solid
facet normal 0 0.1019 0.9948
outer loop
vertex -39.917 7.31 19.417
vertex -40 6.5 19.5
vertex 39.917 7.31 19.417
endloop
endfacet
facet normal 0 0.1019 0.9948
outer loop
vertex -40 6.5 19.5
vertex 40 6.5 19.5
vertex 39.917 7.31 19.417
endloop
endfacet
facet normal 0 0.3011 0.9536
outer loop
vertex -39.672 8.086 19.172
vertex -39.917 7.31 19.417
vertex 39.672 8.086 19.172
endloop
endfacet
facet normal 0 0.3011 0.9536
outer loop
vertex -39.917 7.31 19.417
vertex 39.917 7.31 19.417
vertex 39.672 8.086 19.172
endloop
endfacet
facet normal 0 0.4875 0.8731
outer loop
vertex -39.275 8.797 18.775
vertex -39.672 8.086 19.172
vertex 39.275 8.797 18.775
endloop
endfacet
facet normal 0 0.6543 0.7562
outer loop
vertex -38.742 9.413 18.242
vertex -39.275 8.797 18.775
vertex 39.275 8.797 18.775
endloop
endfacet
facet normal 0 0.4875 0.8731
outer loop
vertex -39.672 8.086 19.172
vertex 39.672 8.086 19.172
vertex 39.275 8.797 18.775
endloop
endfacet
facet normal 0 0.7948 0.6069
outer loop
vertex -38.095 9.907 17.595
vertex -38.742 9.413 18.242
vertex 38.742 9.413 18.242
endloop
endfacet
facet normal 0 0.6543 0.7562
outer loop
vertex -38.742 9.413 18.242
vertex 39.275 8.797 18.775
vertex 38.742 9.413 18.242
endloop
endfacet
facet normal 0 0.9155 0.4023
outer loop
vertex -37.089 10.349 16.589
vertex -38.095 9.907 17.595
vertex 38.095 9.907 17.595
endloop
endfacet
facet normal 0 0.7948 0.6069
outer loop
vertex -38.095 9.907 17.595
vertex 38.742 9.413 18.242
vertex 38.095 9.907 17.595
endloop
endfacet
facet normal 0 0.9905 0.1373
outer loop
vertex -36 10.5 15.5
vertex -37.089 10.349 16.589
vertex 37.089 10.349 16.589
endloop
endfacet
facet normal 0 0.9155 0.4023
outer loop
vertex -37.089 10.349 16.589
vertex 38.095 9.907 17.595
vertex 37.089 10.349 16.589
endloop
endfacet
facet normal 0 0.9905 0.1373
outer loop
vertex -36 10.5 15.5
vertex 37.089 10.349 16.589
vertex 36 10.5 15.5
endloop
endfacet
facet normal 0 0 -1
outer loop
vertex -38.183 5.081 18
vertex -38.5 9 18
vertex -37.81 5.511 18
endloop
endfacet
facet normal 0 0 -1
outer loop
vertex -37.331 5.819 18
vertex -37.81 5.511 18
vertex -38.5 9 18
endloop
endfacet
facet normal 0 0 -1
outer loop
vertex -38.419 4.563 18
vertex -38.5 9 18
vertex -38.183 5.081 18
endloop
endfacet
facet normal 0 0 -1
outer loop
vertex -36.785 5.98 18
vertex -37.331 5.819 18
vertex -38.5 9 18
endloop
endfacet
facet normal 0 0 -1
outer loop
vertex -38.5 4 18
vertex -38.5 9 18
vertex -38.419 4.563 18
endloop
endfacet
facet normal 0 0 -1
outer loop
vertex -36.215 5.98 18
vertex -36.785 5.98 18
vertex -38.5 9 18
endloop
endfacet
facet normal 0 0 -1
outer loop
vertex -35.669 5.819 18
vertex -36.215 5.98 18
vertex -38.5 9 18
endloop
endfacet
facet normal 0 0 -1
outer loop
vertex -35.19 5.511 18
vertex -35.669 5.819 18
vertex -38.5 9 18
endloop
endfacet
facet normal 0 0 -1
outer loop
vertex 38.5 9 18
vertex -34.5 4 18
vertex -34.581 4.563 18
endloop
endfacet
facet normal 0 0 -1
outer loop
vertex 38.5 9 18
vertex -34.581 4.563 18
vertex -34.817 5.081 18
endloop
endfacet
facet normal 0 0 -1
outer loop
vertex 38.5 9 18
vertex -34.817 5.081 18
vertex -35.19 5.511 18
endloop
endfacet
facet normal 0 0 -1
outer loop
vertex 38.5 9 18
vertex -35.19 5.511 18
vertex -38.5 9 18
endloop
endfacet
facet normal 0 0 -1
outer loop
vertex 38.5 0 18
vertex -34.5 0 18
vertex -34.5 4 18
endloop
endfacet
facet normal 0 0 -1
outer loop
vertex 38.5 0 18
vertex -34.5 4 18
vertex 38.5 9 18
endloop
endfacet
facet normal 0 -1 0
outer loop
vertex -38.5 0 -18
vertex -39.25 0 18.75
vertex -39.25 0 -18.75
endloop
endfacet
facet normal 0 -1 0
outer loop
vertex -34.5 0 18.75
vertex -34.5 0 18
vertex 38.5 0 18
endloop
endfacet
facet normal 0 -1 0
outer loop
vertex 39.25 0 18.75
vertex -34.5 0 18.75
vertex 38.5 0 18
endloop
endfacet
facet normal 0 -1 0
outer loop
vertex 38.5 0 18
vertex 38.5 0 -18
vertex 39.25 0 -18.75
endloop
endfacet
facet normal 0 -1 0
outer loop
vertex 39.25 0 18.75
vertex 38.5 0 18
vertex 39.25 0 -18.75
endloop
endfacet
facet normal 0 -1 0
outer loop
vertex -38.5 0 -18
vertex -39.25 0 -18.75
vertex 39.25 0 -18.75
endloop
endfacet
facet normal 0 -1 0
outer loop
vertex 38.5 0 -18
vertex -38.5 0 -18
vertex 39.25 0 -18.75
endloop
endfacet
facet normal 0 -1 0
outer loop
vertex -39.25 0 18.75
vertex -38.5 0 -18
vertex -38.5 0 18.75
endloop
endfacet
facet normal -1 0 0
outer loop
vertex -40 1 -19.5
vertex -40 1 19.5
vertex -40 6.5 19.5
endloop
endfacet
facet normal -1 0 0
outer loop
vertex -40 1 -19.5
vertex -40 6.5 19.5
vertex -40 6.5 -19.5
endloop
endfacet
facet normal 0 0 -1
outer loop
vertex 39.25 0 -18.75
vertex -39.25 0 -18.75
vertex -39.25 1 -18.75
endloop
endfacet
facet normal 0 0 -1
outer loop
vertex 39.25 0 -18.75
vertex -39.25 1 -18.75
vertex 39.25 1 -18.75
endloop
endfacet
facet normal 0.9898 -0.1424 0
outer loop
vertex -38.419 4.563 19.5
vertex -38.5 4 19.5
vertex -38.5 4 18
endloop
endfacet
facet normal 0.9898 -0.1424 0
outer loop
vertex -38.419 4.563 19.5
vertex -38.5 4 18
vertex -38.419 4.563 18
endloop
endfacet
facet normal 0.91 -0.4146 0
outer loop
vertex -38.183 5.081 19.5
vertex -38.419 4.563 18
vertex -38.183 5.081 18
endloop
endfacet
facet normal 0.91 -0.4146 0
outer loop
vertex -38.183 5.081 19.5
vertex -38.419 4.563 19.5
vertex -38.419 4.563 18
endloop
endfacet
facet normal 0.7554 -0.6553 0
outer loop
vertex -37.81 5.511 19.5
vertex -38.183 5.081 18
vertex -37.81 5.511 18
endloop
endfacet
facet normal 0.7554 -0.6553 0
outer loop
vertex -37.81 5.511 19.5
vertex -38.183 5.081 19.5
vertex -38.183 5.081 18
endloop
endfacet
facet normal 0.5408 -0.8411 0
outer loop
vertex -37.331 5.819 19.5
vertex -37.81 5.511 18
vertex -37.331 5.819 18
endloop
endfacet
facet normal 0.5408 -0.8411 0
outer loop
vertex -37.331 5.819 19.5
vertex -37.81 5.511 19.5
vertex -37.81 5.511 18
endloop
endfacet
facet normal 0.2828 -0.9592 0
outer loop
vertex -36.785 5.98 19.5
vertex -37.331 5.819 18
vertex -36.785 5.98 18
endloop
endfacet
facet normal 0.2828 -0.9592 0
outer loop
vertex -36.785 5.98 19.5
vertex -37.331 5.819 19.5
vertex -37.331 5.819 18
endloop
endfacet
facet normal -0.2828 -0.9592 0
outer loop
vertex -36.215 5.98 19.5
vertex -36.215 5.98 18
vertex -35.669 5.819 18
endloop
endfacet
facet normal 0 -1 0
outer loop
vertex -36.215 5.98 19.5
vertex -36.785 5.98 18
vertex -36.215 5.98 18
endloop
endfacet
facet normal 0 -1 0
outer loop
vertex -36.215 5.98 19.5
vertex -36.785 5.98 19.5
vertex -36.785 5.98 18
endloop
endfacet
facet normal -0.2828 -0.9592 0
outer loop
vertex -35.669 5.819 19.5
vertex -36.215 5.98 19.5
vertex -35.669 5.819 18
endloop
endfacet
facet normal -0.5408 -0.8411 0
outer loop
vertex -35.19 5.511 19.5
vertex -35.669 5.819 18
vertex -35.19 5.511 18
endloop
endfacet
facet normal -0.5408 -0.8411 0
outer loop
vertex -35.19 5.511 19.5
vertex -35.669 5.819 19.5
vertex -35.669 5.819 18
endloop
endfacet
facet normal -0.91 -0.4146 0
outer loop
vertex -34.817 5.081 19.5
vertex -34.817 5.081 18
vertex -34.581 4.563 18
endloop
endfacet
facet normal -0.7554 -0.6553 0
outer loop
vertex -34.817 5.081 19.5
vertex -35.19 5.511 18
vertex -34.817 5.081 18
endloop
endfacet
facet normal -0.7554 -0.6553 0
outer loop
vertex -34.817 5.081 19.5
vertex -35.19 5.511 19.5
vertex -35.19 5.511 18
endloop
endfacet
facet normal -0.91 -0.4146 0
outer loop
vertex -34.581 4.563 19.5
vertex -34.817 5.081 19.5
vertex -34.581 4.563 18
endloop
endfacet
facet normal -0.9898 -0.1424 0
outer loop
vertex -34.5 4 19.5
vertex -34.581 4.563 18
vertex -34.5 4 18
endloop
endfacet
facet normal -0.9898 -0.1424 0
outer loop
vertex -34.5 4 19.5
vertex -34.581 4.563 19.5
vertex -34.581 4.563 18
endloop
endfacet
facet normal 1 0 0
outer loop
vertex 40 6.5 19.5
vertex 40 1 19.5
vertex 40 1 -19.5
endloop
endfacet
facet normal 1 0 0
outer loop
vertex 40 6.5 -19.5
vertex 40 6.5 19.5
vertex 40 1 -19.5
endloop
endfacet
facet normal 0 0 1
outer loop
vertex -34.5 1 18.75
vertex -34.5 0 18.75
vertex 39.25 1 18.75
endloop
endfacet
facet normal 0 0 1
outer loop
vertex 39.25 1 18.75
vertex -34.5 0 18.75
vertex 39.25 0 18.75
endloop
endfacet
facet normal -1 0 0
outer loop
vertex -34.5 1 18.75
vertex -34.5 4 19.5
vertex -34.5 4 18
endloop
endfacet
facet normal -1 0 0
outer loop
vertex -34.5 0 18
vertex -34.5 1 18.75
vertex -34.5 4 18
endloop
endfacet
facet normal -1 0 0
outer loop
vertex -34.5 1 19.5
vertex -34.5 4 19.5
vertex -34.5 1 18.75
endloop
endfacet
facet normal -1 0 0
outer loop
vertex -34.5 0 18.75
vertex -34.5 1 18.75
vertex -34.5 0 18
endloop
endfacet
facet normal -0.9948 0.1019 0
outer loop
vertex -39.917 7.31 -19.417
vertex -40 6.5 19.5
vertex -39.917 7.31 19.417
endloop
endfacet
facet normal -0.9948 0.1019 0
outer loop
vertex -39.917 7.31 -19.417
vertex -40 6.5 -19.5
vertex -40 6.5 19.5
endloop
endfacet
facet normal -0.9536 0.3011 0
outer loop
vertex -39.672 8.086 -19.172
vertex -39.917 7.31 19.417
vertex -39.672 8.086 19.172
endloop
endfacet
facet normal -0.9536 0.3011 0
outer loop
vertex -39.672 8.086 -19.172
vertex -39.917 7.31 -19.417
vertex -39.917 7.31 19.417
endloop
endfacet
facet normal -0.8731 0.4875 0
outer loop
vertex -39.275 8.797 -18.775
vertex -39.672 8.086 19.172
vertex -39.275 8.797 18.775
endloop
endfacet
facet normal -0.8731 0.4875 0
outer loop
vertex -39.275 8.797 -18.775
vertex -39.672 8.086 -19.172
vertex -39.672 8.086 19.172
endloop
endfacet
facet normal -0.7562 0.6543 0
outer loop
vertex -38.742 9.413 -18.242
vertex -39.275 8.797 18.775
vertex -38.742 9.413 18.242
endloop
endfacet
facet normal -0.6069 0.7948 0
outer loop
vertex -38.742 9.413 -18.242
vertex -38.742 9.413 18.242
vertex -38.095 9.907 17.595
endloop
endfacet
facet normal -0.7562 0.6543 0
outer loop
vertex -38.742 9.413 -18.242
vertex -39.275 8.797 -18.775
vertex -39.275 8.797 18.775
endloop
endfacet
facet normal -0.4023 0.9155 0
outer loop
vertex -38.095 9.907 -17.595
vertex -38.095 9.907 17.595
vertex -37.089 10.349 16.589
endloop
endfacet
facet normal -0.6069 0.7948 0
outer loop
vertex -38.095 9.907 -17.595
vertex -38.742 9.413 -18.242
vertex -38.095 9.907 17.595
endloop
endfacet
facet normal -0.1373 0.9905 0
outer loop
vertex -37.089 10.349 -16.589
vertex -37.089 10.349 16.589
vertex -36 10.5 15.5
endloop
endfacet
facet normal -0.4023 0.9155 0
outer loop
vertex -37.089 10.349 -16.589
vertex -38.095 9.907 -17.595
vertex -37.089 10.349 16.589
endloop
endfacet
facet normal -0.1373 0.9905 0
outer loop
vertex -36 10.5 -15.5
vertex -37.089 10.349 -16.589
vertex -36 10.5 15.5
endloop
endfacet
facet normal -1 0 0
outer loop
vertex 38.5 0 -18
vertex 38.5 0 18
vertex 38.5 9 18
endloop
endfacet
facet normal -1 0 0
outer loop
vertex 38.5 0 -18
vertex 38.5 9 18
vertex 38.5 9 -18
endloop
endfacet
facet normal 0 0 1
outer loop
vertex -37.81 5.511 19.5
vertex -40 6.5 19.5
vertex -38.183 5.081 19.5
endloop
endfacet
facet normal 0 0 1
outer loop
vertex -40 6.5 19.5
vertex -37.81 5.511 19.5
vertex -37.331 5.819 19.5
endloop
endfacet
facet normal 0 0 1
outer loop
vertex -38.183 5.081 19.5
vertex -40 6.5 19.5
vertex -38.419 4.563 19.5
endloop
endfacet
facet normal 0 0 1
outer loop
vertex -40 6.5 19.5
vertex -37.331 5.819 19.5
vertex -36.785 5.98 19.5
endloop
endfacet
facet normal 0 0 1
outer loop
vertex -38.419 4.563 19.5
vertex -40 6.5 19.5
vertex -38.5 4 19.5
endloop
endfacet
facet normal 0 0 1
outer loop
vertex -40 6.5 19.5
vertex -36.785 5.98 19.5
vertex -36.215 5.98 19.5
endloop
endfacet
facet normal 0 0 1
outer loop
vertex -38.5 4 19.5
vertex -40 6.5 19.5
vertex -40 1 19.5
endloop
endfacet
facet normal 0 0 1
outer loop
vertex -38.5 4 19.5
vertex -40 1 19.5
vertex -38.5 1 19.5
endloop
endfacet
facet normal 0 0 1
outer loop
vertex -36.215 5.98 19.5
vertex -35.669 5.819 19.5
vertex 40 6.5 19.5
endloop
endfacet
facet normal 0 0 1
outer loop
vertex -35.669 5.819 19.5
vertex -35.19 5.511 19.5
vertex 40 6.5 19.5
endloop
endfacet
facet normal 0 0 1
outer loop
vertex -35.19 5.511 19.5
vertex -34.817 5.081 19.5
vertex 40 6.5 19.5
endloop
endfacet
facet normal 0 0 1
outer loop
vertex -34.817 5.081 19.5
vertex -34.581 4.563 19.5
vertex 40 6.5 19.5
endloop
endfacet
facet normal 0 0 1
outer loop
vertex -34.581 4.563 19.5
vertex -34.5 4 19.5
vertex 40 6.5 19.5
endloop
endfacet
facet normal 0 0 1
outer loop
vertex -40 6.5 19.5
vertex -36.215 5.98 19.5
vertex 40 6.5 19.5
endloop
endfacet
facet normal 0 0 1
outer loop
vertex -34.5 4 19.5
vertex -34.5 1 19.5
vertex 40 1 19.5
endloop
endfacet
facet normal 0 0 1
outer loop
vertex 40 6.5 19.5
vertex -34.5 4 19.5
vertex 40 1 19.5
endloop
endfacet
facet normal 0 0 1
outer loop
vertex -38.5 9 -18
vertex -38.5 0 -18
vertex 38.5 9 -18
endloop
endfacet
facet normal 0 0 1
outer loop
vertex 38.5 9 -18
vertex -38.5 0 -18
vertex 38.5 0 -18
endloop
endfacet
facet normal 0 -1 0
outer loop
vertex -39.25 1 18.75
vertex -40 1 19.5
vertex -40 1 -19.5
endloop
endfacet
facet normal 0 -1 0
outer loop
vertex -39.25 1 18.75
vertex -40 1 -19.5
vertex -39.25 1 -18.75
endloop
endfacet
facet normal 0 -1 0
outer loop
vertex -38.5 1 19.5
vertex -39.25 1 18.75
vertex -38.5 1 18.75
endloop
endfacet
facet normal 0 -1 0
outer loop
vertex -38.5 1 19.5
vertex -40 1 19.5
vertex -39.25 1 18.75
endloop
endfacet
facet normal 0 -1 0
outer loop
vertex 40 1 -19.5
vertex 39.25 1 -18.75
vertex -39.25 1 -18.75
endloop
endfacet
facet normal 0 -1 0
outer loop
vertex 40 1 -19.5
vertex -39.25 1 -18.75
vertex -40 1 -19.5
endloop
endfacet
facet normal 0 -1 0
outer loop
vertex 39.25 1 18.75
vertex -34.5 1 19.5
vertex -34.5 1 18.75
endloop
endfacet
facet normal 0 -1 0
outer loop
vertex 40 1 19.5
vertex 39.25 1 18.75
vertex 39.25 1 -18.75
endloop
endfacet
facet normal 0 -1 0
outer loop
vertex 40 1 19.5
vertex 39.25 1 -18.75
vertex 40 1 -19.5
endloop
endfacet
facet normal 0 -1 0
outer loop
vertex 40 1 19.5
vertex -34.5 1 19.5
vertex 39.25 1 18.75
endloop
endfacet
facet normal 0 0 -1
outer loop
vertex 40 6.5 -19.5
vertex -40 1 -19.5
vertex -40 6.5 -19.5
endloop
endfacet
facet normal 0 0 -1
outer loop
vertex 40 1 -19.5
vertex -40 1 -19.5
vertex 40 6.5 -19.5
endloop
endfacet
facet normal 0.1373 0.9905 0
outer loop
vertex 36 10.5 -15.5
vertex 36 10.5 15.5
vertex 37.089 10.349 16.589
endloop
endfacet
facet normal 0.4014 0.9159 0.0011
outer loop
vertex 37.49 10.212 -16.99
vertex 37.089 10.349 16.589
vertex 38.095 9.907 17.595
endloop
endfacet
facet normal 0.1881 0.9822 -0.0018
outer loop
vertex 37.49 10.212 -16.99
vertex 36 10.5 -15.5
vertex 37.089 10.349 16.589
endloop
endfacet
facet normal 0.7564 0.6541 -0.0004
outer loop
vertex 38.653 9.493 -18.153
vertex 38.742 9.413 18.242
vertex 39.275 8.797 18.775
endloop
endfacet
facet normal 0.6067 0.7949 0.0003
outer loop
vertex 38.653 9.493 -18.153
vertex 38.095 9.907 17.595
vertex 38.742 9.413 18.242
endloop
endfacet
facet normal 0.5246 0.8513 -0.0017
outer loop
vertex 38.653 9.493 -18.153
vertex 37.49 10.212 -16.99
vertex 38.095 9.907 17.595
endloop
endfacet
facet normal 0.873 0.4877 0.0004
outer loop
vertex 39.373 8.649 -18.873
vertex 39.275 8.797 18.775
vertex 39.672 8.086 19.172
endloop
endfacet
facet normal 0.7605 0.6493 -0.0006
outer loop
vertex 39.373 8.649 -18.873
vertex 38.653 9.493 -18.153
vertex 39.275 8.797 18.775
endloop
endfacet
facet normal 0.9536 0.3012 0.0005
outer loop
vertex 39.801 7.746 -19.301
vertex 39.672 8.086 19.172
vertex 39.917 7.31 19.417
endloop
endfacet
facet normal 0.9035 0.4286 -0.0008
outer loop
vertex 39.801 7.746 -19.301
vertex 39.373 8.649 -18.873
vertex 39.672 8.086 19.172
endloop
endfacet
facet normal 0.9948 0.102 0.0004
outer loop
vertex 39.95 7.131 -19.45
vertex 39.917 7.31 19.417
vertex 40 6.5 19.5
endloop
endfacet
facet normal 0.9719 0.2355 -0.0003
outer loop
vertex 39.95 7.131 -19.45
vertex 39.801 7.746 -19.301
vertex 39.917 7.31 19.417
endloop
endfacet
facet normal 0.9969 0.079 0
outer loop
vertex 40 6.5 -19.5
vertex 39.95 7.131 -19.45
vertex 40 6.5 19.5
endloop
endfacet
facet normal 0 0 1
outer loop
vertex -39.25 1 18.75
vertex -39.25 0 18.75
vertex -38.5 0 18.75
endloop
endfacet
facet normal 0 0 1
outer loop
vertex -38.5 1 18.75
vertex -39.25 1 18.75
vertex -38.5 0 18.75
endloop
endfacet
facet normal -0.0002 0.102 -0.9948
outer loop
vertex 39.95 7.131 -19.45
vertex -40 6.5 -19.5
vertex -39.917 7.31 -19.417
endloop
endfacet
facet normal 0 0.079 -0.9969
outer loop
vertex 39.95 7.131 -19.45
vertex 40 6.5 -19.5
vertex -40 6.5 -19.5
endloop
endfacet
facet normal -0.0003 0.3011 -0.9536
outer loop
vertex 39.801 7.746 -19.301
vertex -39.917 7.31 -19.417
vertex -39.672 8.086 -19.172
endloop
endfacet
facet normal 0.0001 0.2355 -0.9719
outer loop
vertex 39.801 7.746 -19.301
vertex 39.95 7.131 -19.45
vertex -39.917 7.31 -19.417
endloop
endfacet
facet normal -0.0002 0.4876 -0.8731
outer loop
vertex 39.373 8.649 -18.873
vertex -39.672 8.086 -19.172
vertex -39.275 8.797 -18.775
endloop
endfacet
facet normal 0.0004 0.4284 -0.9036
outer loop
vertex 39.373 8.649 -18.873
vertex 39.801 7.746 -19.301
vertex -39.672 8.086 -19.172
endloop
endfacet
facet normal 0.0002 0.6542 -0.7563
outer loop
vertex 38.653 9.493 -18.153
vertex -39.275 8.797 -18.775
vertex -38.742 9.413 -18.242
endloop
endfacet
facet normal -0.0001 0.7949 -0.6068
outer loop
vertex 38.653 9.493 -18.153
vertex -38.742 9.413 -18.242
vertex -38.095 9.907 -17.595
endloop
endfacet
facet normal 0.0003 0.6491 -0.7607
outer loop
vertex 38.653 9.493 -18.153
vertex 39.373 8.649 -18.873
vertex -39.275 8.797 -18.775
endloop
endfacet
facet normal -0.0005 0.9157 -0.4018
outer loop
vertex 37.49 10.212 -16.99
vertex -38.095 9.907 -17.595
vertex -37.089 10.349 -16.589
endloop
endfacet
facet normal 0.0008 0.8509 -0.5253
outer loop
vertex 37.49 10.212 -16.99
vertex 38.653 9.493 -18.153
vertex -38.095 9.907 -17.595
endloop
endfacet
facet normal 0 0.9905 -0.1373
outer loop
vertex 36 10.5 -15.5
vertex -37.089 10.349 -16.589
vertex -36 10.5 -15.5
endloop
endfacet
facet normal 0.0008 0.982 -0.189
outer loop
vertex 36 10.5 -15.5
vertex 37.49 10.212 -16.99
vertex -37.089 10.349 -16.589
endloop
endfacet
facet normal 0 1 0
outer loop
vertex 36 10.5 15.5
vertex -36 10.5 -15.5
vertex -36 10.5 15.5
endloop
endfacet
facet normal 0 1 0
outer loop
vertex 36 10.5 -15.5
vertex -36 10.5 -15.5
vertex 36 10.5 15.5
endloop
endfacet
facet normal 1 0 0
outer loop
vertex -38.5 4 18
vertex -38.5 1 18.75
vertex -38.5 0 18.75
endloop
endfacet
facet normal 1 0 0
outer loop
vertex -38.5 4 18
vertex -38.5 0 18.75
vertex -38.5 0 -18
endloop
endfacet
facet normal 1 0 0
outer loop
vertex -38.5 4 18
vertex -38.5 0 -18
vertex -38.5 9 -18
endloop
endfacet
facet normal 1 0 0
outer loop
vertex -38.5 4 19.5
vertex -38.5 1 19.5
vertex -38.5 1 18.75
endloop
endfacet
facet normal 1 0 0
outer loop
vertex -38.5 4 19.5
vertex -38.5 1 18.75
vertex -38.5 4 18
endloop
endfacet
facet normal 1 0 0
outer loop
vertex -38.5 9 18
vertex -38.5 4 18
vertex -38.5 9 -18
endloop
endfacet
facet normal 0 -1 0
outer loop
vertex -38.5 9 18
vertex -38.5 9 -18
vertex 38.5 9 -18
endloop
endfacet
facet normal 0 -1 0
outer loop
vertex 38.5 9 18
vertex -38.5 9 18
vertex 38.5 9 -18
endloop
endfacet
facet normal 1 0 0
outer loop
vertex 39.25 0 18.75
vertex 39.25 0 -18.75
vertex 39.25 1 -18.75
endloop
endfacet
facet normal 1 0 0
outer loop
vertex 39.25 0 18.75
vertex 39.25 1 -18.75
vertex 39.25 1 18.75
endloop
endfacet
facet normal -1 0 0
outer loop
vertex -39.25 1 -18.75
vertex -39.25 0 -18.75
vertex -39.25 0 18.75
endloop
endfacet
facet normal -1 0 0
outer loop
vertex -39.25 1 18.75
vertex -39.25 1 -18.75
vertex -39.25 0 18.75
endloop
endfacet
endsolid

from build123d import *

# Parameters (mm, degrees)
SKETCH1_W           = 80
SKETCH1_H           = 39
SKETCH1_W_2         = 77
SKETCH1_H_2         = 36
BOSS_EXTRUDE1_DEPTH = 9
SKETCH2_W           = 80
SKETCH2_H           = 39
BOSS_EXTRUDE2_DEPTH = 1.5
SKETCH4_W           = 80
SKETCH4_H           = 39
SKETCH4_W_2         = 78.5
SKETCH4_H_2         = 37.5
CUT_EXTRUDE1_DEPTH  = 1
FILLET1_R           = 4
CUT_EXTRUDE2_REACH  = 58.844


with BuildPart() as part:
    # Sketch1 → Boss-Extrude1 (new body)
    with BuildSketch(Plane(origin=(0, 0, 0), x_dir=(1, 0, 0), z_dir=(0, 1, 0))):
        Rectangle(SKETCH1_W, SKETCH1_H)
        Rectangle(SKETCH1_W_2, SKETCH1_H_2, mode=Mode.SUBTRACT)
    extrude(amount=BOSS_EXTRUDE1_DEPTH)

    # Sketch2 → Boss-Extrude2 (add)
    with BuildSketch(Plane(origin=(0, 9, 0), x_dir=(1, 0, 0), z_dir=(0, 1, 0))):
        Rectangle(SKETCH2_W, SKETCH2_H)
    extrude(amount=BOSS_EXTRUDE2_DEPTH)

    # Sketch4 → Cut-Extrude1 (cut)
    with BuildSketch(Plane.XZ):
        Rectangle(SKETCH4_W, SKETCH4_H)
        Rectangle(SKETCH4_W_2, SKETCH4_H_2, mode=Mode.SUBTRACT)
    extrude(amount=-CUT_EXTRUDE1_DEPTH, mode=Mode.SUBTRACT)

    # Fillet1
    fillet1_edges = [part.edges().sort_by_distance(p)[0] for p in [
        (-40, 10.5, 0),
        (0, 10.5, 19.5),
        (40, 10.5, 0),
        (0, 10.5, -19.5),
    ]]
    fillet(fillet1_edges, radius=FILLET1_R)

    # Sketch5 → Cut-Extrude2 (cut, up to next)
    with BuildSketch(Plane.XY.offset(19.5), mode=Mode.PRIVATE) as cut_extrude2_sk1:
        with BuildLine():
            Line((-38.5, -2), (-38.5, 4))
            ThreePointArc((-38.5, 4), (-36.5, 6), (-34.5, 4))
            Line((-34.5, 4), (-34.5, -2))
            ThreePointArc((-34.5, -2), (-36.5, -4), (-38.5, -2))
        make_face()
    cut_extrude2_tool1 = extrude(cut_extrude2_sk1.sketch, amount=-CUT_EXTRUDE2_REACH, mode=Mode.PRIVATE) & part.part
    add(cut_extrude2_tool1.solids().sort_by_distance((-36.5, 1, 19.5))[0], mode=Mode.SUBTRACT)


solid = part.part
